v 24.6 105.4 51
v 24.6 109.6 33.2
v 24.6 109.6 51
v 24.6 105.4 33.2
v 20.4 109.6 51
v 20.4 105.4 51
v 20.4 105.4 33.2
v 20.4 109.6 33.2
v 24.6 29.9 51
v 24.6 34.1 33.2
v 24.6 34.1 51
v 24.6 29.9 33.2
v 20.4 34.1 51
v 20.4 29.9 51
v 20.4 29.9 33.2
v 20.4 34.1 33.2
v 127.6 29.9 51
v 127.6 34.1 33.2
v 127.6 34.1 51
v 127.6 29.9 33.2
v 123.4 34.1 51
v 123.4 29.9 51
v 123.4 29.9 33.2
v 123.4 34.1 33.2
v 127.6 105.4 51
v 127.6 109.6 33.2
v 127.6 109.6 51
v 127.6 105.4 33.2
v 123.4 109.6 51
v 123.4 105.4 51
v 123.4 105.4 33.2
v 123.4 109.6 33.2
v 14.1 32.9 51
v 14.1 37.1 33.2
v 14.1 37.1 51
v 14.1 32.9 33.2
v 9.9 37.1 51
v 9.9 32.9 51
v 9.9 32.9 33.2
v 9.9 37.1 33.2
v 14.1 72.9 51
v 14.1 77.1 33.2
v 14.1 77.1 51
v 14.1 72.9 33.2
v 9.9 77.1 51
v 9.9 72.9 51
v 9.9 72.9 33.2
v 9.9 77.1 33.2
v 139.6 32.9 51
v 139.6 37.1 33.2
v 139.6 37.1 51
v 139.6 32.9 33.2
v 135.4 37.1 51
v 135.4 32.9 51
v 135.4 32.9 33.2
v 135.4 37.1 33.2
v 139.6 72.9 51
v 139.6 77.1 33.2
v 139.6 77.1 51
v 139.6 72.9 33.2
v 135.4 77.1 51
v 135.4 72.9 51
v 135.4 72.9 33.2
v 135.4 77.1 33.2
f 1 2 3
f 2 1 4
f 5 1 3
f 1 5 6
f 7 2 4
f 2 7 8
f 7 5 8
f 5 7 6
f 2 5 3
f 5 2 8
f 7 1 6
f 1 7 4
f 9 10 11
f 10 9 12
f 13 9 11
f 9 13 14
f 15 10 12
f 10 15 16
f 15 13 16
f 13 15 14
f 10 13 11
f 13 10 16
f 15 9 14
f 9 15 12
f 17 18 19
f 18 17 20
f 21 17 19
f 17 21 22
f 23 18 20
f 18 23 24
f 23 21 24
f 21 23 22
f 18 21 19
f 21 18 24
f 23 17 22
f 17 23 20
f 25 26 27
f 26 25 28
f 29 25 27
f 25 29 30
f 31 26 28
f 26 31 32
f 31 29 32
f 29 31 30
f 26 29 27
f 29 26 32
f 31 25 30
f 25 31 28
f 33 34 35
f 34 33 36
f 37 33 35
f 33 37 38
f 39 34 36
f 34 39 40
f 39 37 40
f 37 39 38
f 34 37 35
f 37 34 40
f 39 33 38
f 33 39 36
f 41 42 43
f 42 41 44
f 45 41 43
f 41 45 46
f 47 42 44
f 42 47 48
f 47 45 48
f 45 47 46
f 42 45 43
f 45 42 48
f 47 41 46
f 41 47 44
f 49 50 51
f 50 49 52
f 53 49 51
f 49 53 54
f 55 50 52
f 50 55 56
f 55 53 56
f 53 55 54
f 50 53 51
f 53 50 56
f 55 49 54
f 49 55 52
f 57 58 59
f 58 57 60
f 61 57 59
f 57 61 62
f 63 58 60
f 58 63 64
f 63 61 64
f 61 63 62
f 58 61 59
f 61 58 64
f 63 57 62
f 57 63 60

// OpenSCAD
// Generated by spec/prepare_parent_retrofit_printing.py from validated release fasteners. NOT A PRINTABLE PART.
union(){
translate([20.4, 105.4, 33.2000015258789]) cube([4.2, 4.2, 17.79999771118164]);
translate([20.4, 29.9, 33.2000015258789]) cube([4.2, 4.2, 17.79999771118164]);
translate([123.4, 29.9, 33.2000015258789]) cube([4.2, 4.2, 17.79999771118164]);
translate([123.4, 105.4, 33.2000015258789]) cube([4.2, 4.2, 17.79999771118164]);
translate([9.9, 32.9, 33.2000015258789]) cube([4.2, 4.2, 17.79999771118164]);
translate([9.9, 72.9, 33.2000015258789]) cube([4.2, 4.2, 17.79999771118164]);
translate([135.4, 32.9, 33.2000015258789]) cube([4.2, 4.2, 17.79999771118164]);
translate([135.4, 72.9, 33.2000015258789]) cube([4.2, 4.2, 17.79999771118164]);
}
